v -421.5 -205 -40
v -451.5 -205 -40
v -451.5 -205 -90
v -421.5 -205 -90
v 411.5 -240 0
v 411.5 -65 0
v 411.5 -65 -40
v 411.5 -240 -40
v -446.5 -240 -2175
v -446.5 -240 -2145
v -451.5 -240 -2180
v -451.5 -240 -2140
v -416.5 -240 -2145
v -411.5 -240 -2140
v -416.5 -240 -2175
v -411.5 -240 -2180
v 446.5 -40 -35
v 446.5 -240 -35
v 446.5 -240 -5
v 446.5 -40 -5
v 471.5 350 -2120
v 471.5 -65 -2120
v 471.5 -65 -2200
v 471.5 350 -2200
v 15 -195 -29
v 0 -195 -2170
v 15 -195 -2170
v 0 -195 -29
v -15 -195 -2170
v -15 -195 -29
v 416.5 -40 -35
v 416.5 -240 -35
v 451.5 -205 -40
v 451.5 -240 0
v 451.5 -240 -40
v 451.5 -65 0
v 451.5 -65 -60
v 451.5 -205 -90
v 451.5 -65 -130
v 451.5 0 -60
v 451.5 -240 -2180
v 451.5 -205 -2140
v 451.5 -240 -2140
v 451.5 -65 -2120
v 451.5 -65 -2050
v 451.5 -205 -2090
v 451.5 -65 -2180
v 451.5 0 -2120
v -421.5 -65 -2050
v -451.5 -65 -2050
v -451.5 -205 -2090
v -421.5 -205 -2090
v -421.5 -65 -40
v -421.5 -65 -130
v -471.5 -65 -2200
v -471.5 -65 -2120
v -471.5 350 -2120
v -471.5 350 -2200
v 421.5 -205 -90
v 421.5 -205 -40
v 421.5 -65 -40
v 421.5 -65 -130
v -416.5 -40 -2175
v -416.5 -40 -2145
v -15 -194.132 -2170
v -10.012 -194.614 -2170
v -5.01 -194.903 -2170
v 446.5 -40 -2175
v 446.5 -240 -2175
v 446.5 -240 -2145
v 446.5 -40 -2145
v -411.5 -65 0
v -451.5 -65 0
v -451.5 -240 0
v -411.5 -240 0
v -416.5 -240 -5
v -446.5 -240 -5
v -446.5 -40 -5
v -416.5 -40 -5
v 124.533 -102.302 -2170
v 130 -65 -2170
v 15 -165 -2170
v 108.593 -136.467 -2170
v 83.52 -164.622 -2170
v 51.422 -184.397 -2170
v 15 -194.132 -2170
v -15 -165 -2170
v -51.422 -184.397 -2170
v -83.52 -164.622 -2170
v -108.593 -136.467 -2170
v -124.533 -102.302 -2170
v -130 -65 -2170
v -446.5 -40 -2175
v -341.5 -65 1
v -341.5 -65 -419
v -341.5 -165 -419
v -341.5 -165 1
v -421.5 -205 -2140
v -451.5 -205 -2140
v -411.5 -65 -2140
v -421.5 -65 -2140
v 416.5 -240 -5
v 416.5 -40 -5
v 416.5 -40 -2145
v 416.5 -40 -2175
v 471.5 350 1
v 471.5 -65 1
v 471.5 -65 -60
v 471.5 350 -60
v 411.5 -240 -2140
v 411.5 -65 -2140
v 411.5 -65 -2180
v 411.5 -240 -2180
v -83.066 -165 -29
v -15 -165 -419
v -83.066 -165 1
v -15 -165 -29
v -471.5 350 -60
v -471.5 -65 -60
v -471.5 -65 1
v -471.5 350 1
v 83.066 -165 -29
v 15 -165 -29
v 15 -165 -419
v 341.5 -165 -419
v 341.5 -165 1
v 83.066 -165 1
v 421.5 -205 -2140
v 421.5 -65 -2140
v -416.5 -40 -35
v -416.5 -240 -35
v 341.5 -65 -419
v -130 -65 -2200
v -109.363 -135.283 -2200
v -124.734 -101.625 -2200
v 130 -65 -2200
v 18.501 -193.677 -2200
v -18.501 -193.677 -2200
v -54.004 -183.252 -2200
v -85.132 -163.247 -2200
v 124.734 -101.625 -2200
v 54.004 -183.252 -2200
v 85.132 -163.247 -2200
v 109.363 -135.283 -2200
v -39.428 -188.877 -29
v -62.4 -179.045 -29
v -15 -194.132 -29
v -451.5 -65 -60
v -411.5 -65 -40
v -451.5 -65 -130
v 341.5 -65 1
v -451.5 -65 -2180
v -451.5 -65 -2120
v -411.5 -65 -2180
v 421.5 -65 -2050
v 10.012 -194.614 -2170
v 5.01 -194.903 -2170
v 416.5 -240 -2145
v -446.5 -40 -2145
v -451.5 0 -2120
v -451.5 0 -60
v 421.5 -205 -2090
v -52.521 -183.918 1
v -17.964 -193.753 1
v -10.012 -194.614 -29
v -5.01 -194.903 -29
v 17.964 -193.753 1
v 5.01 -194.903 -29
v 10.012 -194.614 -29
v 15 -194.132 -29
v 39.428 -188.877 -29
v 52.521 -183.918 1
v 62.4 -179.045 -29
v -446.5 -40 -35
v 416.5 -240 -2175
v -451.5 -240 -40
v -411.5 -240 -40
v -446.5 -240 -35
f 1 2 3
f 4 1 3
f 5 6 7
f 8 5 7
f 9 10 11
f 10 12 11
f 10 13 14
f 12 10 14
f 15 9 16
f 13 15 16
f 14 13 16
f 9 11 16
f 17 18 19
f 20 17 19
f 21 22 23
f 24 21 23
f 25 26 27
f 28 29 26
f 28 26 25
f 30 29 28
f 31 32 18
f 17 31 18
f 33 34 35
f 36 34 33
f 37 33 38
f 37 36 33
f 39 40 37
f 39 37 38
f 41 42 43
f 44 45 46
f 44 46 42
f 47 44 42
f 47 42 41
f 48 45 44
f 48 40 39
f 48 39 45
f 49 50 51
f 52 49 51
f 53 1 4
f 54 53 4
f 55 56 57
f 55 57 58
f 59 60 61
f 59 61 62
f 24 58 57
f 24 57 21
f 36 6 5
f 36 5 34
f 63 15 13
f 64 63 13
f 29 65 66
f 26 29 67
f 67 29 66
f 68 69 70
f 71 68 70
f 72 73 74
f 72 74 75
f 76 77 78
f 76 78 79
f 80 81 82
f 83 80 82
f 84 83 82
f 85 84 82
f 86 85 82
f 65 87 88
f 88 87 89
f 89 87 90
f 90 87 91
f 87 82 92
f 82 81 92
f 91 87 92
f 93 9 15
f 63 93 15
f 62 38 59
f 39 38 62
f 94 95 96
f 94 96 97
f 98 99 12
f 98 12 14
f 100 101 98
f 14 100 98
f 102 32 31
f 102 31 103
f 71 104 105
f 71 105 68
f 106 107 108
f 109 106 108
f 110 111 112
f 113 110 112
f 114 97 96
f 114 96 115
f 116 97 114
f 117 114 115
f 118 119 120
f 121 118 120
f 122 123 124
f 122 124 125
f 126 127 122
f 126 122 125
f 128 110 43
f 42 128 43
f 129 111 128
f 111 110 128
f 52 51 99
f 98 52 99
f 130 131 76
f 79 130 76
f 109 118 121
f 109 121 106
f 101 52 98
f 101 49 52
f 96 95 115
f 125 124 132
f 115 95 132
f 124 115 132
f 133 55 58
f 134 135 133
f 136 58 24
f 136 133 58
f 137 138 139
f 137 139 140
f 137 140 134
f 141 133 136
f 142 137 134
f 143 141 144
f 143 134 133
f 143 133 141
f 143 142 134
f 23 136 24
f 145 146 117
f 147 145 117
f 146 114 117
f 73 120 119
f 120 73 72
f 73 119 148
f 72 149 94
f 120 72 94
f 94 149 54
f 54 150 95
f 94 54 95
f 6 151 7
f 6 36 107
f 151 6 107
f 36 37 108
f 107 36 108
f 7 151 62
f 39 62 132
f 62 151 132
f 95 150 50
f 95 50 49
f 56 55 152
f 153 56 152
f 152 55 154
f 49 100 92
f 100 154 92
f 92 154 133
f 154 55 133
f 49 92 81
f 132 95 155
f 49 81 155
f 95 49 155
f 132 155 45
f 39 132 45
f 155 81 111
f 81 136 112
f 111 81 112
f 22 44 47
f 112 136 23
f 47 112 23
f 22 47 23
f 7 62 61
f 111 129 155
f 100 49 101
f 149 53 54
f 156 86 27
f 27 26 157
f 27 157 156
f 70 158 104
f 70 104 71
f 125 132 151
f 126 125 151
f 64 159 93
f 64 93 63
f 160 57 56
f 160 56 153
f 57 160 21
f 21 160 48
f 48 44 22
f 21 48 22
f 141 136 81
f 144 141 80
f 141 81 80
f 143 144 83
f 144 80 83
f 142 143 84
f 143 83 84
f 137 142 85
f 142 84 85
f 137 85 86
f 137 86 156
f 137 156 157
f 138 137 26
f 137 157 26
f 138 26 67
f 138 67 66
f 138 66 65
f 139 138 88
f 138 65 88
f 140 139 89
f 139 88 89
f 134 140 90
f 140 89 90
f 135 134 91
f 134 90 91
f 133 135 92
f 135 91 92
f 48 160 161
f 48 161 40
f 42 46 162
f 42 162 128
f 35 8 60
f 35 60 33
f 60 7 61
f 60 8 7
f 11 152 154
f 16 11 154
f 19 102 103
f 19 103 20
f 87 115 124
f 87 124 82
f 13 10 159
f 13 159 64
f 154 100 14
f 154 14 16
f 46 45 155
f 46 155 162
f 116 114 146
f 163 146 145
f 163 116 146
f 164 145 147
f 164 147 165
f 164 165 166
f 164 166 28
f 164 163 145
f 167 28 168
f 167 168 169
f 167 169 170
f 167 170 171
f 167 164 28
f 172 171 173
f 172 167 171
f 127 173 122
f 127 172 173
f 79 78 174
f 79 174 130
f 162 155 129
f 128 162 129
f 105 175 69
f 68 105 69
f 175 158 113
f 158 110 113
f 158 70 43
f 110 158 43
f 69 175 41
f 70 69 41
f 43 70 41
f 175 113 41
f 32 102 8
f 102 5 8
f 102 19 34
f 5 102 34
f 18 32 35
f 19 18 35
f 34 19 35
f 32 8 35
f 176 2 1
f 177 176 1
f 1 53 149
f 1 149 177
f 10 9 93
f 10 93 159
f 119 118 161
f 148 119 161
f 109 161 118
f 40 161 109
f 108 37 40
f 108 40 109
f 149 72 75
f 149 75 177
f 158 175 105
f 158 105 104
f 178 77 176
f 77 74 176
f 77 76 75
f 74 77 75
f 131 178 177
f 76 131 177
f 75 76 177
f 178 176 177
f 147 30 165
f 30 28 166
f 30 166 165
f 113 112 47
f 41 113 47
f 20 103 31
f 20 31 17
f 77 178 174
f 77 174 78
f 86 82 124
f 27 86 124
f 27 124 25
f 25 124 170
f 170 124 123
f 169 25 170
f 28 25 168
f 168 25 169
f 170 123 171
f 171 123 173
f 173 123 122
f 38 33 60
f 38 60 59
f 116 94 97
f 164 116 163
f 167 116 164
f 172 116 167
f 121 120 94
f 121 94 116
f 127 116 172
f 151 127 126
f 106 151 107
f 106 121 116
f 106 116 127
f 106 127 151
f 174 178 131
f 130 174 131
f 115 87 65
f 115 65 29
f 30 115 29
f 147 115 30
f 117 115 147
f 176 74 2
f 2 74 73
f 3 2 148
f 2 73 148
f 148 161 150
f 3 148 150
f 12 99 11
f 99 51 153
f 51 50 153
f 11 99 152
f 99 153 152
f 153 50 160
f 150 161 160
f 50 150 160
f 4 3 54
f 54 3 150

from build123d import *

# Parameters (mm, degrees)
BOSS_EXTRUDE1_DEPTH      = 65
BOSS_EXTRUDE2_DEPTH      = 350
BOSS_EXTRUDE2_DEPTH_BACK = 50
SKETCH1_3_W              = 943
SKETCH1_3_H              = 80
SKETCH1_3_H_2            = 61
SKETCH1_4_W              = 40
SKETCH1_4_H              = 40
BOSS_EXTRUDE3_DEPTH      = 240
BOSS_EXTRUDE4_DEPTH      = 30
BOSS_EXTRUDE5_DEPTH      = 30
SKETCH5_W                = 30
SKETCH5_H                = 30
CUT_EXTRUDE1_DEPTH       = 200
BOSS_EXTRUDE6_DEPTH      = 30
BOSS_EXTRUDE7_START      = -30
BOSS_EXTRUDE7_DEPTH      = 30
BOSS_EXTRUDE8_DEPTH      = 15
BOSS_EXTRUDE8_DEPTH_BACK = 15
SKETCH8_W                = 683
SKETCH8_H                = 420
BOSS_EXTRUDE9_DEPTH      = 100


with BuildPart() as part:
    # Sketch1 → Boss-Extrude1 (new body)
    with BuildSketch(Plane(origin=(0, 0, 0), x_dir=(1, 0, 0), z_dir=(0, 1, 0))):
        Polygon((-451.5, 60), (-471.5, 60), (-471.5, -1), (471.5, -1), (471.5, 60), (451.5, 60), (451.5, 2120), (471.5, 2120), (471.5, 2200), (-471.5, 2200), (-471.5, 2120), (-451.5, 2120), align=None)
    extrude(amount=-BOSS_EXTRUDE1_DEPTH)

    # Sketch1<3> → Boss-Extrude2 (add, two sides: drawn at the far end of the back side and taken through both)
    with BuildSketch(Plane(origin=(0, 0, 0), x_dir=(1, 0, 0), z_dir=(0, 1, 0)).offset(-BOSS_EXTRUDE2_DEPTH_BACK)):
        with Locations((0, 2160)):
            Rectangle(SKETCH1_3_W, SKETCH1_3_H)
        with Locations((0, 29.5)):
            Rectangle(SKETCH1_3_W, SKETCH1_3_H_2)
    extrude(amount=BOSS_EXTRUDE2_DEPTH + BOSS_EXTRUDE2_DEPTH_BACK)

    # Sketch1<4> → Boss-Extrude3 (add)
    with BuildSketch(Plane(origin=(0, 0, 0), x_dir=(1, 0, 0), z_dir=(0, 1, 0))):
        with Locations((-431.5, 20)):
            Rectangle(SKETCH1_4_W, SKETCH1_4_H)
        with Locations((431.5, 20)):
            Rectangle(SKETCH1_4_W, SKETCH1_4_H)
        with Locations((-431.5, 2160)):
            Rectangle(SKETCH1_4_W, SKETCH1_4_H)
        with Locations((431.5, 2160)):
            Rectangle(SKETCH1_4_W, SKETCH1_4_H)
    extrude(amount=-BOSS_EXTRUDE3_DEPTH)

    # Sketch3 → Boss-Extrude4 (add)
    with BuildSketch(Plane(origin=(451.5, 0, 0), x_dir=(0, 0, -1), z_dir=(1, 0, 0))):
        Polygon((40, -65), (40, -205), (90, -205), (130, -65), align=None)
        Polygon((2140, -65), (2050, -65), (2090, -205), (2140, -205), align=None)
    extrude(amount=-BOSS_EXTRUDE4_DEPTH)

    # Sketch4 → Boss-Extrude5 (add)
    with BuildSketch(Plane(origin=(-451.5, 0, -45.75), x_dir=(0, 0, -1), z_dir=(1, 0, 0))):
        Polygon((2044.25, -205), (2094.25, -205), (2094.25, -65), (2004.25, -65), align=None)
        Polygon((44.25, -205), (84.25, -65), (-5.75, -65), (-5.75, -205), align=None)
    extrude(amount=BOSS_EXTRUDE5_DEPTH)

    # Sketch5 → Cut-Extrude1 (cut)
    with BuildSketch(Plane.XZ.offset(240)):
        with Locations((-431.5, -2160)):
            Rectangle(SKETCH5_W, SKETCH5_H)
        with Locations((431.5, -2160)):
            Rectangle(SKETCH5_W, SKETCH5_H)
        with Locations((431.5, -20)):
            Rectangle(SKETCH5_W, SKETCH5_H)
        with Locations((-431.5, -20)):
            Rectangle(SKETCH5_W, SKETCH5_H)
    extrude(amount=-CUT_EXTRUDE1_DEPTH, mode=Mode.SUBTRACT)

    # Sketch6 → Boss-Extrude6 (add)
    with BuildSketch(Plane.XY.offset(1)):
        with BuildLine():
            Line((130, -65), (-130, -65))
            ThreePointArc((-130, -65), (0, -195), (130, -65))
        make_face()
    extrude(amount=-BOSS_EXTRUDE6_DEPTH)

    # Sketch7 → Boss-Extrude7 (add)
    with BuildSketch(Plane(origin=(0, 0, -2200), x_dir=(-1, 0, 0), z_dir=(0, 0, -1)).offset(BOSS_EXTRUDE7_START)):
        with BuildLine():
            Line((130, -65), (-130, -65))
            ThreePointArc((-130, -65), (0, -195), (130, -65))
        make_face()
    extrude(amount=BOSS_EXTRUDE7_DEPTH)

    # 3DSketch1 → Boss-Extrude8 (add, two sides: drawn at the far end of the back side and taken through both)
    with BuildSketch(Plane(origin=(0, -195, -29), x_dir=(0, 0.014010768487145287, -0.9999018443659355), z_dir=(1, 0, 0)).offset(-BOSS_EXTRUDE8_DEPTH_BACK)):
        Polygon((0, 0), (0.420323055, 29.997055331), (2141.210171842, 0), (2140.789848787, -29.997055331), align=None)
    extrude(amount=BOSS_EXTRUDE8_DEPTH + BOSS_EXTRUDE8_DEPTH_BACK)

    # Sketch8 → Boss-Extrude9 (add)
    with BuildSketch(Plane.XZ.offset(65)):
        with Locations((0, -209)):
            Rectangle(SKETCH8_W, SKETCH8_H)
    extrude(amount=BOSS_EXTRUDE9_DEPTH)


solid = part.part
